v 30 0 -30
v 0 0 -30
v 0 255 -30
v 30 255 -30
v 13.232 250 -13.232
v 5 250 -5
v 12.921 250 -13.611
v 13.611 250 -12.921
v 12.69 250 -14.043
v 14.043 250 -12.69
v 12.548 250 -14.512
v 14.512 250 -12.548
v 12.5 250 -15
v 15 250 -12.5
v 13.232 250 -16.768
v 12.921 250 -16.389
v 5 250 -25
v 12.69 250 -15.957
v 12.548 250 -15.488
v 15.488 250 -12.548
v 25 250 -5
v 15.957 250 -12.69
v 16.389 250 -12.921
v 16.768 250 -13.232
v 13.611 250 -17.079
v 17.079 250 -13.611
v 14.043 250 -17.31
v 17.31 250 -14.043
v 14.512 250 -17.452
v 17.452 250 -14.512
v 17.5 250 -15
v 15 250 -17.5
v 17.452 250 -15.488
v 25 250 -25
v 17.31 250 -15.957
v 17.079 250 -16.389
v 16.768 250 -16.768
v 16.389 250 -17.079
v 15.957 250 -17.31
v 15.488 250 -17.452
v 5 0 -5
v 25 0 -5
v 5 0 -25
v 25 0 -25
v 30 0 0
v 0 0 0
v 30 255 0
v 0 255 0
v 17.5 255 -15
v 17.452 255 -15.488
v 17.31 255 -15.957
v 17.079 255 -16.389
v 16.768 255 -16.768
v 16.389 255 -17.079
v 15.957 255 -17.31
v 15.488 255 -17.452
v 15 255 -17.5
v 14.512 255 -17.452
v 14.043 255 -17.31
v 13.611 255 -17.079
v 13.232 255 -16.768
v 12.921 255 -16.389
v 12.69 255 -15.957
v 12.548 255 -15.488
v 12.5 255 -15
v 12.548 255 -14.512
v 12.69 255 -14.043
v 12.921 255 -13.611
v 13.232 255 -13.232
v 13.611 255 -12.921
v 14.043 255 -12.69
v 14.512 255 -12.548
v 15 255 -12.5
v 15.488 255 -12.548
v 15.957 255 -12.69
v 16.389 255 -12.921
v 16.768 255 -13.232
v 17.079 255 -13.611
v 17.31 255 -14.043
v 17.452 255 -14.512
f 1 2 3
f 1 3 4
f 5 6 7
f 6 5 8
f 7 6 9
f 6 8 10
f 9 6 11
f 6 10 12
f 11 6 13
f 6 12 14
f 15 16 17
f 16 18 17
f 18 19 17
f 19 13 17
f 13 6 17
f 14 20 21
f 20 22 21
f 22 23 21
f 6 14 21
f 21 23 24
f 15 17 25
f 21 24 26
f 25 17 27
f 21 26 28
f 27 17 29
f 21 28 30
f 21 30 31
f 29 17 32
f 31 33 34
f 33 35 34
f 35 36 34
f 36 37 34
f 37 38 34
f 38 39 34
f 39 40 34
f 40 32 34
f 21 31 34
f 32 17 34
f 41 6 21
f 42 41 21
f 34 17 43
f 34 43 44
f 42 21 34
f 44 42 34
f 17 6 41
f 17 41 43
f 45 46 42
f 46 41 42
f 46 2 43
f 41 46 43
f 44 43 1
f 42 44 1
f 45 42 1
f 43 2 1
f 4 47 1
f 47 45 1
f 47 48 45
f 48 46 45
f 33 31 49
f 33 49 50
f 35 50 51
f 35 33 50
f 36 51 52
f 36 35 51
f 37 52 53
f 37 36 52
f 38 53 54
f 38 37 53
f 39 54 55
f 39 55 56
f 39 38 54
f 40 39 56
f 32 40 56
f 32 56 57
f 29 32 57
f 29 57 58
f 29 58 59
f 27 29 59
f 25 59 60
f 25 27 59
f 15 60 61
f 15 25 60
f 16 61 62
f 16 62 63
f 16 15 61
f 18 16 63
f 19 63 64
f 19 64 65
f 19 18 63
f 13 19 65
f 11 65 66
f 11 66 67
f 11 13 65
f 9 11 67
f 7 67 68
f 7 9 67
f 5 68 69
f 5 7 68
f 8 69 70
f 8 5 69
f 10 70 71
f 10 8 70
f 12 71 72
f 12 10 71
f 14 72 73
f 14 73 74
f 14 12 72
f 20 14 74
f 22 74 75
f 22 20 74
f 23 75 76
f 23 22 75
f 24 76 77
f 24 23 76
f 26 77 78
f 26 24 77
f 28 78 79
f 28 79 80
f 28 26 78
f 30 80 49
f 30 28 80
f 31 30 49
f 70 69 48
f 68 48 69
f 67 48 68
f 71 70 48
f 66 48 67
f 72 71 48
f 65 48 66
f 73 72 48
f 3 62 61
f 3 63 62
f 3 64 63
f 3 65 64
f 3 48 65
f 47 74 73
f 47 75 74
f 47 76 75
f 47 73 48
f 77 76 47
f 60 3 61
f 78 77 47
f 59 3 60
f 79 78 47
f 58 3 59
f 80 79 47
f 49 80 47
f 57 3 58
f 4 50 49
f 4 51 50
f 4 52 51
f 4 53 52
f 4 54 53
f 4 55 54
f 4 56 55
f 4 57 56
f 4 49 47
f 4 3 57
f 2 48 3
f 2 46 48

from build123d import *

# Parameters (mm, degrees)
SKETCH1_W           = 30
SKETCH1_H           = 30
SKETCH1_W_2         = 20
SKETCH1_H_2         = 20
BOSS_EXTRUDE1_DEPTH = 250
SKETCH2_W           = 30
SKETCH2_H           = 30
SKETCH2_R           = 2.5
BOSS_EXTRUDE2_DEPTH = 5


with BuildPart() as part:
    # Sketch1 → Boss-Extrude1 (new body)
    with BuildSketch(Plane(origin=(0, 0, 0), x_dir=(1, 0, 0), z_dir=(0, 1, 0))):
        with Locations((15, 15)):
            Rectangle(SKETCH1_W, SKETCH1_H)
        with Locations((15, 15)):
            Rectangle(SKETCH1_W_2, SKETCH1_H_2, mode=Mode.SUBTRACT)
    extrude(amount=BOSS_EXTRUDE1_DEPTH)

    # Sketch2 → Boss-Extrude2 (add)
    with BuildSketch(Plane(origin=(0, 250, 0), x_dir=(1, 0, 0), z_dir=(0, 1, 0))):
        with Locations((15, 15)):
            Rectangle(SKETCH2_W, SKETCH2_H)
        with Locations((15, 15)):
            Circle(SKETCH2_R, mode=Mode.SUBTRACT)
    extrude(amount=BOSS_EXTRUDE2_DEPTH)


solid = part.part
